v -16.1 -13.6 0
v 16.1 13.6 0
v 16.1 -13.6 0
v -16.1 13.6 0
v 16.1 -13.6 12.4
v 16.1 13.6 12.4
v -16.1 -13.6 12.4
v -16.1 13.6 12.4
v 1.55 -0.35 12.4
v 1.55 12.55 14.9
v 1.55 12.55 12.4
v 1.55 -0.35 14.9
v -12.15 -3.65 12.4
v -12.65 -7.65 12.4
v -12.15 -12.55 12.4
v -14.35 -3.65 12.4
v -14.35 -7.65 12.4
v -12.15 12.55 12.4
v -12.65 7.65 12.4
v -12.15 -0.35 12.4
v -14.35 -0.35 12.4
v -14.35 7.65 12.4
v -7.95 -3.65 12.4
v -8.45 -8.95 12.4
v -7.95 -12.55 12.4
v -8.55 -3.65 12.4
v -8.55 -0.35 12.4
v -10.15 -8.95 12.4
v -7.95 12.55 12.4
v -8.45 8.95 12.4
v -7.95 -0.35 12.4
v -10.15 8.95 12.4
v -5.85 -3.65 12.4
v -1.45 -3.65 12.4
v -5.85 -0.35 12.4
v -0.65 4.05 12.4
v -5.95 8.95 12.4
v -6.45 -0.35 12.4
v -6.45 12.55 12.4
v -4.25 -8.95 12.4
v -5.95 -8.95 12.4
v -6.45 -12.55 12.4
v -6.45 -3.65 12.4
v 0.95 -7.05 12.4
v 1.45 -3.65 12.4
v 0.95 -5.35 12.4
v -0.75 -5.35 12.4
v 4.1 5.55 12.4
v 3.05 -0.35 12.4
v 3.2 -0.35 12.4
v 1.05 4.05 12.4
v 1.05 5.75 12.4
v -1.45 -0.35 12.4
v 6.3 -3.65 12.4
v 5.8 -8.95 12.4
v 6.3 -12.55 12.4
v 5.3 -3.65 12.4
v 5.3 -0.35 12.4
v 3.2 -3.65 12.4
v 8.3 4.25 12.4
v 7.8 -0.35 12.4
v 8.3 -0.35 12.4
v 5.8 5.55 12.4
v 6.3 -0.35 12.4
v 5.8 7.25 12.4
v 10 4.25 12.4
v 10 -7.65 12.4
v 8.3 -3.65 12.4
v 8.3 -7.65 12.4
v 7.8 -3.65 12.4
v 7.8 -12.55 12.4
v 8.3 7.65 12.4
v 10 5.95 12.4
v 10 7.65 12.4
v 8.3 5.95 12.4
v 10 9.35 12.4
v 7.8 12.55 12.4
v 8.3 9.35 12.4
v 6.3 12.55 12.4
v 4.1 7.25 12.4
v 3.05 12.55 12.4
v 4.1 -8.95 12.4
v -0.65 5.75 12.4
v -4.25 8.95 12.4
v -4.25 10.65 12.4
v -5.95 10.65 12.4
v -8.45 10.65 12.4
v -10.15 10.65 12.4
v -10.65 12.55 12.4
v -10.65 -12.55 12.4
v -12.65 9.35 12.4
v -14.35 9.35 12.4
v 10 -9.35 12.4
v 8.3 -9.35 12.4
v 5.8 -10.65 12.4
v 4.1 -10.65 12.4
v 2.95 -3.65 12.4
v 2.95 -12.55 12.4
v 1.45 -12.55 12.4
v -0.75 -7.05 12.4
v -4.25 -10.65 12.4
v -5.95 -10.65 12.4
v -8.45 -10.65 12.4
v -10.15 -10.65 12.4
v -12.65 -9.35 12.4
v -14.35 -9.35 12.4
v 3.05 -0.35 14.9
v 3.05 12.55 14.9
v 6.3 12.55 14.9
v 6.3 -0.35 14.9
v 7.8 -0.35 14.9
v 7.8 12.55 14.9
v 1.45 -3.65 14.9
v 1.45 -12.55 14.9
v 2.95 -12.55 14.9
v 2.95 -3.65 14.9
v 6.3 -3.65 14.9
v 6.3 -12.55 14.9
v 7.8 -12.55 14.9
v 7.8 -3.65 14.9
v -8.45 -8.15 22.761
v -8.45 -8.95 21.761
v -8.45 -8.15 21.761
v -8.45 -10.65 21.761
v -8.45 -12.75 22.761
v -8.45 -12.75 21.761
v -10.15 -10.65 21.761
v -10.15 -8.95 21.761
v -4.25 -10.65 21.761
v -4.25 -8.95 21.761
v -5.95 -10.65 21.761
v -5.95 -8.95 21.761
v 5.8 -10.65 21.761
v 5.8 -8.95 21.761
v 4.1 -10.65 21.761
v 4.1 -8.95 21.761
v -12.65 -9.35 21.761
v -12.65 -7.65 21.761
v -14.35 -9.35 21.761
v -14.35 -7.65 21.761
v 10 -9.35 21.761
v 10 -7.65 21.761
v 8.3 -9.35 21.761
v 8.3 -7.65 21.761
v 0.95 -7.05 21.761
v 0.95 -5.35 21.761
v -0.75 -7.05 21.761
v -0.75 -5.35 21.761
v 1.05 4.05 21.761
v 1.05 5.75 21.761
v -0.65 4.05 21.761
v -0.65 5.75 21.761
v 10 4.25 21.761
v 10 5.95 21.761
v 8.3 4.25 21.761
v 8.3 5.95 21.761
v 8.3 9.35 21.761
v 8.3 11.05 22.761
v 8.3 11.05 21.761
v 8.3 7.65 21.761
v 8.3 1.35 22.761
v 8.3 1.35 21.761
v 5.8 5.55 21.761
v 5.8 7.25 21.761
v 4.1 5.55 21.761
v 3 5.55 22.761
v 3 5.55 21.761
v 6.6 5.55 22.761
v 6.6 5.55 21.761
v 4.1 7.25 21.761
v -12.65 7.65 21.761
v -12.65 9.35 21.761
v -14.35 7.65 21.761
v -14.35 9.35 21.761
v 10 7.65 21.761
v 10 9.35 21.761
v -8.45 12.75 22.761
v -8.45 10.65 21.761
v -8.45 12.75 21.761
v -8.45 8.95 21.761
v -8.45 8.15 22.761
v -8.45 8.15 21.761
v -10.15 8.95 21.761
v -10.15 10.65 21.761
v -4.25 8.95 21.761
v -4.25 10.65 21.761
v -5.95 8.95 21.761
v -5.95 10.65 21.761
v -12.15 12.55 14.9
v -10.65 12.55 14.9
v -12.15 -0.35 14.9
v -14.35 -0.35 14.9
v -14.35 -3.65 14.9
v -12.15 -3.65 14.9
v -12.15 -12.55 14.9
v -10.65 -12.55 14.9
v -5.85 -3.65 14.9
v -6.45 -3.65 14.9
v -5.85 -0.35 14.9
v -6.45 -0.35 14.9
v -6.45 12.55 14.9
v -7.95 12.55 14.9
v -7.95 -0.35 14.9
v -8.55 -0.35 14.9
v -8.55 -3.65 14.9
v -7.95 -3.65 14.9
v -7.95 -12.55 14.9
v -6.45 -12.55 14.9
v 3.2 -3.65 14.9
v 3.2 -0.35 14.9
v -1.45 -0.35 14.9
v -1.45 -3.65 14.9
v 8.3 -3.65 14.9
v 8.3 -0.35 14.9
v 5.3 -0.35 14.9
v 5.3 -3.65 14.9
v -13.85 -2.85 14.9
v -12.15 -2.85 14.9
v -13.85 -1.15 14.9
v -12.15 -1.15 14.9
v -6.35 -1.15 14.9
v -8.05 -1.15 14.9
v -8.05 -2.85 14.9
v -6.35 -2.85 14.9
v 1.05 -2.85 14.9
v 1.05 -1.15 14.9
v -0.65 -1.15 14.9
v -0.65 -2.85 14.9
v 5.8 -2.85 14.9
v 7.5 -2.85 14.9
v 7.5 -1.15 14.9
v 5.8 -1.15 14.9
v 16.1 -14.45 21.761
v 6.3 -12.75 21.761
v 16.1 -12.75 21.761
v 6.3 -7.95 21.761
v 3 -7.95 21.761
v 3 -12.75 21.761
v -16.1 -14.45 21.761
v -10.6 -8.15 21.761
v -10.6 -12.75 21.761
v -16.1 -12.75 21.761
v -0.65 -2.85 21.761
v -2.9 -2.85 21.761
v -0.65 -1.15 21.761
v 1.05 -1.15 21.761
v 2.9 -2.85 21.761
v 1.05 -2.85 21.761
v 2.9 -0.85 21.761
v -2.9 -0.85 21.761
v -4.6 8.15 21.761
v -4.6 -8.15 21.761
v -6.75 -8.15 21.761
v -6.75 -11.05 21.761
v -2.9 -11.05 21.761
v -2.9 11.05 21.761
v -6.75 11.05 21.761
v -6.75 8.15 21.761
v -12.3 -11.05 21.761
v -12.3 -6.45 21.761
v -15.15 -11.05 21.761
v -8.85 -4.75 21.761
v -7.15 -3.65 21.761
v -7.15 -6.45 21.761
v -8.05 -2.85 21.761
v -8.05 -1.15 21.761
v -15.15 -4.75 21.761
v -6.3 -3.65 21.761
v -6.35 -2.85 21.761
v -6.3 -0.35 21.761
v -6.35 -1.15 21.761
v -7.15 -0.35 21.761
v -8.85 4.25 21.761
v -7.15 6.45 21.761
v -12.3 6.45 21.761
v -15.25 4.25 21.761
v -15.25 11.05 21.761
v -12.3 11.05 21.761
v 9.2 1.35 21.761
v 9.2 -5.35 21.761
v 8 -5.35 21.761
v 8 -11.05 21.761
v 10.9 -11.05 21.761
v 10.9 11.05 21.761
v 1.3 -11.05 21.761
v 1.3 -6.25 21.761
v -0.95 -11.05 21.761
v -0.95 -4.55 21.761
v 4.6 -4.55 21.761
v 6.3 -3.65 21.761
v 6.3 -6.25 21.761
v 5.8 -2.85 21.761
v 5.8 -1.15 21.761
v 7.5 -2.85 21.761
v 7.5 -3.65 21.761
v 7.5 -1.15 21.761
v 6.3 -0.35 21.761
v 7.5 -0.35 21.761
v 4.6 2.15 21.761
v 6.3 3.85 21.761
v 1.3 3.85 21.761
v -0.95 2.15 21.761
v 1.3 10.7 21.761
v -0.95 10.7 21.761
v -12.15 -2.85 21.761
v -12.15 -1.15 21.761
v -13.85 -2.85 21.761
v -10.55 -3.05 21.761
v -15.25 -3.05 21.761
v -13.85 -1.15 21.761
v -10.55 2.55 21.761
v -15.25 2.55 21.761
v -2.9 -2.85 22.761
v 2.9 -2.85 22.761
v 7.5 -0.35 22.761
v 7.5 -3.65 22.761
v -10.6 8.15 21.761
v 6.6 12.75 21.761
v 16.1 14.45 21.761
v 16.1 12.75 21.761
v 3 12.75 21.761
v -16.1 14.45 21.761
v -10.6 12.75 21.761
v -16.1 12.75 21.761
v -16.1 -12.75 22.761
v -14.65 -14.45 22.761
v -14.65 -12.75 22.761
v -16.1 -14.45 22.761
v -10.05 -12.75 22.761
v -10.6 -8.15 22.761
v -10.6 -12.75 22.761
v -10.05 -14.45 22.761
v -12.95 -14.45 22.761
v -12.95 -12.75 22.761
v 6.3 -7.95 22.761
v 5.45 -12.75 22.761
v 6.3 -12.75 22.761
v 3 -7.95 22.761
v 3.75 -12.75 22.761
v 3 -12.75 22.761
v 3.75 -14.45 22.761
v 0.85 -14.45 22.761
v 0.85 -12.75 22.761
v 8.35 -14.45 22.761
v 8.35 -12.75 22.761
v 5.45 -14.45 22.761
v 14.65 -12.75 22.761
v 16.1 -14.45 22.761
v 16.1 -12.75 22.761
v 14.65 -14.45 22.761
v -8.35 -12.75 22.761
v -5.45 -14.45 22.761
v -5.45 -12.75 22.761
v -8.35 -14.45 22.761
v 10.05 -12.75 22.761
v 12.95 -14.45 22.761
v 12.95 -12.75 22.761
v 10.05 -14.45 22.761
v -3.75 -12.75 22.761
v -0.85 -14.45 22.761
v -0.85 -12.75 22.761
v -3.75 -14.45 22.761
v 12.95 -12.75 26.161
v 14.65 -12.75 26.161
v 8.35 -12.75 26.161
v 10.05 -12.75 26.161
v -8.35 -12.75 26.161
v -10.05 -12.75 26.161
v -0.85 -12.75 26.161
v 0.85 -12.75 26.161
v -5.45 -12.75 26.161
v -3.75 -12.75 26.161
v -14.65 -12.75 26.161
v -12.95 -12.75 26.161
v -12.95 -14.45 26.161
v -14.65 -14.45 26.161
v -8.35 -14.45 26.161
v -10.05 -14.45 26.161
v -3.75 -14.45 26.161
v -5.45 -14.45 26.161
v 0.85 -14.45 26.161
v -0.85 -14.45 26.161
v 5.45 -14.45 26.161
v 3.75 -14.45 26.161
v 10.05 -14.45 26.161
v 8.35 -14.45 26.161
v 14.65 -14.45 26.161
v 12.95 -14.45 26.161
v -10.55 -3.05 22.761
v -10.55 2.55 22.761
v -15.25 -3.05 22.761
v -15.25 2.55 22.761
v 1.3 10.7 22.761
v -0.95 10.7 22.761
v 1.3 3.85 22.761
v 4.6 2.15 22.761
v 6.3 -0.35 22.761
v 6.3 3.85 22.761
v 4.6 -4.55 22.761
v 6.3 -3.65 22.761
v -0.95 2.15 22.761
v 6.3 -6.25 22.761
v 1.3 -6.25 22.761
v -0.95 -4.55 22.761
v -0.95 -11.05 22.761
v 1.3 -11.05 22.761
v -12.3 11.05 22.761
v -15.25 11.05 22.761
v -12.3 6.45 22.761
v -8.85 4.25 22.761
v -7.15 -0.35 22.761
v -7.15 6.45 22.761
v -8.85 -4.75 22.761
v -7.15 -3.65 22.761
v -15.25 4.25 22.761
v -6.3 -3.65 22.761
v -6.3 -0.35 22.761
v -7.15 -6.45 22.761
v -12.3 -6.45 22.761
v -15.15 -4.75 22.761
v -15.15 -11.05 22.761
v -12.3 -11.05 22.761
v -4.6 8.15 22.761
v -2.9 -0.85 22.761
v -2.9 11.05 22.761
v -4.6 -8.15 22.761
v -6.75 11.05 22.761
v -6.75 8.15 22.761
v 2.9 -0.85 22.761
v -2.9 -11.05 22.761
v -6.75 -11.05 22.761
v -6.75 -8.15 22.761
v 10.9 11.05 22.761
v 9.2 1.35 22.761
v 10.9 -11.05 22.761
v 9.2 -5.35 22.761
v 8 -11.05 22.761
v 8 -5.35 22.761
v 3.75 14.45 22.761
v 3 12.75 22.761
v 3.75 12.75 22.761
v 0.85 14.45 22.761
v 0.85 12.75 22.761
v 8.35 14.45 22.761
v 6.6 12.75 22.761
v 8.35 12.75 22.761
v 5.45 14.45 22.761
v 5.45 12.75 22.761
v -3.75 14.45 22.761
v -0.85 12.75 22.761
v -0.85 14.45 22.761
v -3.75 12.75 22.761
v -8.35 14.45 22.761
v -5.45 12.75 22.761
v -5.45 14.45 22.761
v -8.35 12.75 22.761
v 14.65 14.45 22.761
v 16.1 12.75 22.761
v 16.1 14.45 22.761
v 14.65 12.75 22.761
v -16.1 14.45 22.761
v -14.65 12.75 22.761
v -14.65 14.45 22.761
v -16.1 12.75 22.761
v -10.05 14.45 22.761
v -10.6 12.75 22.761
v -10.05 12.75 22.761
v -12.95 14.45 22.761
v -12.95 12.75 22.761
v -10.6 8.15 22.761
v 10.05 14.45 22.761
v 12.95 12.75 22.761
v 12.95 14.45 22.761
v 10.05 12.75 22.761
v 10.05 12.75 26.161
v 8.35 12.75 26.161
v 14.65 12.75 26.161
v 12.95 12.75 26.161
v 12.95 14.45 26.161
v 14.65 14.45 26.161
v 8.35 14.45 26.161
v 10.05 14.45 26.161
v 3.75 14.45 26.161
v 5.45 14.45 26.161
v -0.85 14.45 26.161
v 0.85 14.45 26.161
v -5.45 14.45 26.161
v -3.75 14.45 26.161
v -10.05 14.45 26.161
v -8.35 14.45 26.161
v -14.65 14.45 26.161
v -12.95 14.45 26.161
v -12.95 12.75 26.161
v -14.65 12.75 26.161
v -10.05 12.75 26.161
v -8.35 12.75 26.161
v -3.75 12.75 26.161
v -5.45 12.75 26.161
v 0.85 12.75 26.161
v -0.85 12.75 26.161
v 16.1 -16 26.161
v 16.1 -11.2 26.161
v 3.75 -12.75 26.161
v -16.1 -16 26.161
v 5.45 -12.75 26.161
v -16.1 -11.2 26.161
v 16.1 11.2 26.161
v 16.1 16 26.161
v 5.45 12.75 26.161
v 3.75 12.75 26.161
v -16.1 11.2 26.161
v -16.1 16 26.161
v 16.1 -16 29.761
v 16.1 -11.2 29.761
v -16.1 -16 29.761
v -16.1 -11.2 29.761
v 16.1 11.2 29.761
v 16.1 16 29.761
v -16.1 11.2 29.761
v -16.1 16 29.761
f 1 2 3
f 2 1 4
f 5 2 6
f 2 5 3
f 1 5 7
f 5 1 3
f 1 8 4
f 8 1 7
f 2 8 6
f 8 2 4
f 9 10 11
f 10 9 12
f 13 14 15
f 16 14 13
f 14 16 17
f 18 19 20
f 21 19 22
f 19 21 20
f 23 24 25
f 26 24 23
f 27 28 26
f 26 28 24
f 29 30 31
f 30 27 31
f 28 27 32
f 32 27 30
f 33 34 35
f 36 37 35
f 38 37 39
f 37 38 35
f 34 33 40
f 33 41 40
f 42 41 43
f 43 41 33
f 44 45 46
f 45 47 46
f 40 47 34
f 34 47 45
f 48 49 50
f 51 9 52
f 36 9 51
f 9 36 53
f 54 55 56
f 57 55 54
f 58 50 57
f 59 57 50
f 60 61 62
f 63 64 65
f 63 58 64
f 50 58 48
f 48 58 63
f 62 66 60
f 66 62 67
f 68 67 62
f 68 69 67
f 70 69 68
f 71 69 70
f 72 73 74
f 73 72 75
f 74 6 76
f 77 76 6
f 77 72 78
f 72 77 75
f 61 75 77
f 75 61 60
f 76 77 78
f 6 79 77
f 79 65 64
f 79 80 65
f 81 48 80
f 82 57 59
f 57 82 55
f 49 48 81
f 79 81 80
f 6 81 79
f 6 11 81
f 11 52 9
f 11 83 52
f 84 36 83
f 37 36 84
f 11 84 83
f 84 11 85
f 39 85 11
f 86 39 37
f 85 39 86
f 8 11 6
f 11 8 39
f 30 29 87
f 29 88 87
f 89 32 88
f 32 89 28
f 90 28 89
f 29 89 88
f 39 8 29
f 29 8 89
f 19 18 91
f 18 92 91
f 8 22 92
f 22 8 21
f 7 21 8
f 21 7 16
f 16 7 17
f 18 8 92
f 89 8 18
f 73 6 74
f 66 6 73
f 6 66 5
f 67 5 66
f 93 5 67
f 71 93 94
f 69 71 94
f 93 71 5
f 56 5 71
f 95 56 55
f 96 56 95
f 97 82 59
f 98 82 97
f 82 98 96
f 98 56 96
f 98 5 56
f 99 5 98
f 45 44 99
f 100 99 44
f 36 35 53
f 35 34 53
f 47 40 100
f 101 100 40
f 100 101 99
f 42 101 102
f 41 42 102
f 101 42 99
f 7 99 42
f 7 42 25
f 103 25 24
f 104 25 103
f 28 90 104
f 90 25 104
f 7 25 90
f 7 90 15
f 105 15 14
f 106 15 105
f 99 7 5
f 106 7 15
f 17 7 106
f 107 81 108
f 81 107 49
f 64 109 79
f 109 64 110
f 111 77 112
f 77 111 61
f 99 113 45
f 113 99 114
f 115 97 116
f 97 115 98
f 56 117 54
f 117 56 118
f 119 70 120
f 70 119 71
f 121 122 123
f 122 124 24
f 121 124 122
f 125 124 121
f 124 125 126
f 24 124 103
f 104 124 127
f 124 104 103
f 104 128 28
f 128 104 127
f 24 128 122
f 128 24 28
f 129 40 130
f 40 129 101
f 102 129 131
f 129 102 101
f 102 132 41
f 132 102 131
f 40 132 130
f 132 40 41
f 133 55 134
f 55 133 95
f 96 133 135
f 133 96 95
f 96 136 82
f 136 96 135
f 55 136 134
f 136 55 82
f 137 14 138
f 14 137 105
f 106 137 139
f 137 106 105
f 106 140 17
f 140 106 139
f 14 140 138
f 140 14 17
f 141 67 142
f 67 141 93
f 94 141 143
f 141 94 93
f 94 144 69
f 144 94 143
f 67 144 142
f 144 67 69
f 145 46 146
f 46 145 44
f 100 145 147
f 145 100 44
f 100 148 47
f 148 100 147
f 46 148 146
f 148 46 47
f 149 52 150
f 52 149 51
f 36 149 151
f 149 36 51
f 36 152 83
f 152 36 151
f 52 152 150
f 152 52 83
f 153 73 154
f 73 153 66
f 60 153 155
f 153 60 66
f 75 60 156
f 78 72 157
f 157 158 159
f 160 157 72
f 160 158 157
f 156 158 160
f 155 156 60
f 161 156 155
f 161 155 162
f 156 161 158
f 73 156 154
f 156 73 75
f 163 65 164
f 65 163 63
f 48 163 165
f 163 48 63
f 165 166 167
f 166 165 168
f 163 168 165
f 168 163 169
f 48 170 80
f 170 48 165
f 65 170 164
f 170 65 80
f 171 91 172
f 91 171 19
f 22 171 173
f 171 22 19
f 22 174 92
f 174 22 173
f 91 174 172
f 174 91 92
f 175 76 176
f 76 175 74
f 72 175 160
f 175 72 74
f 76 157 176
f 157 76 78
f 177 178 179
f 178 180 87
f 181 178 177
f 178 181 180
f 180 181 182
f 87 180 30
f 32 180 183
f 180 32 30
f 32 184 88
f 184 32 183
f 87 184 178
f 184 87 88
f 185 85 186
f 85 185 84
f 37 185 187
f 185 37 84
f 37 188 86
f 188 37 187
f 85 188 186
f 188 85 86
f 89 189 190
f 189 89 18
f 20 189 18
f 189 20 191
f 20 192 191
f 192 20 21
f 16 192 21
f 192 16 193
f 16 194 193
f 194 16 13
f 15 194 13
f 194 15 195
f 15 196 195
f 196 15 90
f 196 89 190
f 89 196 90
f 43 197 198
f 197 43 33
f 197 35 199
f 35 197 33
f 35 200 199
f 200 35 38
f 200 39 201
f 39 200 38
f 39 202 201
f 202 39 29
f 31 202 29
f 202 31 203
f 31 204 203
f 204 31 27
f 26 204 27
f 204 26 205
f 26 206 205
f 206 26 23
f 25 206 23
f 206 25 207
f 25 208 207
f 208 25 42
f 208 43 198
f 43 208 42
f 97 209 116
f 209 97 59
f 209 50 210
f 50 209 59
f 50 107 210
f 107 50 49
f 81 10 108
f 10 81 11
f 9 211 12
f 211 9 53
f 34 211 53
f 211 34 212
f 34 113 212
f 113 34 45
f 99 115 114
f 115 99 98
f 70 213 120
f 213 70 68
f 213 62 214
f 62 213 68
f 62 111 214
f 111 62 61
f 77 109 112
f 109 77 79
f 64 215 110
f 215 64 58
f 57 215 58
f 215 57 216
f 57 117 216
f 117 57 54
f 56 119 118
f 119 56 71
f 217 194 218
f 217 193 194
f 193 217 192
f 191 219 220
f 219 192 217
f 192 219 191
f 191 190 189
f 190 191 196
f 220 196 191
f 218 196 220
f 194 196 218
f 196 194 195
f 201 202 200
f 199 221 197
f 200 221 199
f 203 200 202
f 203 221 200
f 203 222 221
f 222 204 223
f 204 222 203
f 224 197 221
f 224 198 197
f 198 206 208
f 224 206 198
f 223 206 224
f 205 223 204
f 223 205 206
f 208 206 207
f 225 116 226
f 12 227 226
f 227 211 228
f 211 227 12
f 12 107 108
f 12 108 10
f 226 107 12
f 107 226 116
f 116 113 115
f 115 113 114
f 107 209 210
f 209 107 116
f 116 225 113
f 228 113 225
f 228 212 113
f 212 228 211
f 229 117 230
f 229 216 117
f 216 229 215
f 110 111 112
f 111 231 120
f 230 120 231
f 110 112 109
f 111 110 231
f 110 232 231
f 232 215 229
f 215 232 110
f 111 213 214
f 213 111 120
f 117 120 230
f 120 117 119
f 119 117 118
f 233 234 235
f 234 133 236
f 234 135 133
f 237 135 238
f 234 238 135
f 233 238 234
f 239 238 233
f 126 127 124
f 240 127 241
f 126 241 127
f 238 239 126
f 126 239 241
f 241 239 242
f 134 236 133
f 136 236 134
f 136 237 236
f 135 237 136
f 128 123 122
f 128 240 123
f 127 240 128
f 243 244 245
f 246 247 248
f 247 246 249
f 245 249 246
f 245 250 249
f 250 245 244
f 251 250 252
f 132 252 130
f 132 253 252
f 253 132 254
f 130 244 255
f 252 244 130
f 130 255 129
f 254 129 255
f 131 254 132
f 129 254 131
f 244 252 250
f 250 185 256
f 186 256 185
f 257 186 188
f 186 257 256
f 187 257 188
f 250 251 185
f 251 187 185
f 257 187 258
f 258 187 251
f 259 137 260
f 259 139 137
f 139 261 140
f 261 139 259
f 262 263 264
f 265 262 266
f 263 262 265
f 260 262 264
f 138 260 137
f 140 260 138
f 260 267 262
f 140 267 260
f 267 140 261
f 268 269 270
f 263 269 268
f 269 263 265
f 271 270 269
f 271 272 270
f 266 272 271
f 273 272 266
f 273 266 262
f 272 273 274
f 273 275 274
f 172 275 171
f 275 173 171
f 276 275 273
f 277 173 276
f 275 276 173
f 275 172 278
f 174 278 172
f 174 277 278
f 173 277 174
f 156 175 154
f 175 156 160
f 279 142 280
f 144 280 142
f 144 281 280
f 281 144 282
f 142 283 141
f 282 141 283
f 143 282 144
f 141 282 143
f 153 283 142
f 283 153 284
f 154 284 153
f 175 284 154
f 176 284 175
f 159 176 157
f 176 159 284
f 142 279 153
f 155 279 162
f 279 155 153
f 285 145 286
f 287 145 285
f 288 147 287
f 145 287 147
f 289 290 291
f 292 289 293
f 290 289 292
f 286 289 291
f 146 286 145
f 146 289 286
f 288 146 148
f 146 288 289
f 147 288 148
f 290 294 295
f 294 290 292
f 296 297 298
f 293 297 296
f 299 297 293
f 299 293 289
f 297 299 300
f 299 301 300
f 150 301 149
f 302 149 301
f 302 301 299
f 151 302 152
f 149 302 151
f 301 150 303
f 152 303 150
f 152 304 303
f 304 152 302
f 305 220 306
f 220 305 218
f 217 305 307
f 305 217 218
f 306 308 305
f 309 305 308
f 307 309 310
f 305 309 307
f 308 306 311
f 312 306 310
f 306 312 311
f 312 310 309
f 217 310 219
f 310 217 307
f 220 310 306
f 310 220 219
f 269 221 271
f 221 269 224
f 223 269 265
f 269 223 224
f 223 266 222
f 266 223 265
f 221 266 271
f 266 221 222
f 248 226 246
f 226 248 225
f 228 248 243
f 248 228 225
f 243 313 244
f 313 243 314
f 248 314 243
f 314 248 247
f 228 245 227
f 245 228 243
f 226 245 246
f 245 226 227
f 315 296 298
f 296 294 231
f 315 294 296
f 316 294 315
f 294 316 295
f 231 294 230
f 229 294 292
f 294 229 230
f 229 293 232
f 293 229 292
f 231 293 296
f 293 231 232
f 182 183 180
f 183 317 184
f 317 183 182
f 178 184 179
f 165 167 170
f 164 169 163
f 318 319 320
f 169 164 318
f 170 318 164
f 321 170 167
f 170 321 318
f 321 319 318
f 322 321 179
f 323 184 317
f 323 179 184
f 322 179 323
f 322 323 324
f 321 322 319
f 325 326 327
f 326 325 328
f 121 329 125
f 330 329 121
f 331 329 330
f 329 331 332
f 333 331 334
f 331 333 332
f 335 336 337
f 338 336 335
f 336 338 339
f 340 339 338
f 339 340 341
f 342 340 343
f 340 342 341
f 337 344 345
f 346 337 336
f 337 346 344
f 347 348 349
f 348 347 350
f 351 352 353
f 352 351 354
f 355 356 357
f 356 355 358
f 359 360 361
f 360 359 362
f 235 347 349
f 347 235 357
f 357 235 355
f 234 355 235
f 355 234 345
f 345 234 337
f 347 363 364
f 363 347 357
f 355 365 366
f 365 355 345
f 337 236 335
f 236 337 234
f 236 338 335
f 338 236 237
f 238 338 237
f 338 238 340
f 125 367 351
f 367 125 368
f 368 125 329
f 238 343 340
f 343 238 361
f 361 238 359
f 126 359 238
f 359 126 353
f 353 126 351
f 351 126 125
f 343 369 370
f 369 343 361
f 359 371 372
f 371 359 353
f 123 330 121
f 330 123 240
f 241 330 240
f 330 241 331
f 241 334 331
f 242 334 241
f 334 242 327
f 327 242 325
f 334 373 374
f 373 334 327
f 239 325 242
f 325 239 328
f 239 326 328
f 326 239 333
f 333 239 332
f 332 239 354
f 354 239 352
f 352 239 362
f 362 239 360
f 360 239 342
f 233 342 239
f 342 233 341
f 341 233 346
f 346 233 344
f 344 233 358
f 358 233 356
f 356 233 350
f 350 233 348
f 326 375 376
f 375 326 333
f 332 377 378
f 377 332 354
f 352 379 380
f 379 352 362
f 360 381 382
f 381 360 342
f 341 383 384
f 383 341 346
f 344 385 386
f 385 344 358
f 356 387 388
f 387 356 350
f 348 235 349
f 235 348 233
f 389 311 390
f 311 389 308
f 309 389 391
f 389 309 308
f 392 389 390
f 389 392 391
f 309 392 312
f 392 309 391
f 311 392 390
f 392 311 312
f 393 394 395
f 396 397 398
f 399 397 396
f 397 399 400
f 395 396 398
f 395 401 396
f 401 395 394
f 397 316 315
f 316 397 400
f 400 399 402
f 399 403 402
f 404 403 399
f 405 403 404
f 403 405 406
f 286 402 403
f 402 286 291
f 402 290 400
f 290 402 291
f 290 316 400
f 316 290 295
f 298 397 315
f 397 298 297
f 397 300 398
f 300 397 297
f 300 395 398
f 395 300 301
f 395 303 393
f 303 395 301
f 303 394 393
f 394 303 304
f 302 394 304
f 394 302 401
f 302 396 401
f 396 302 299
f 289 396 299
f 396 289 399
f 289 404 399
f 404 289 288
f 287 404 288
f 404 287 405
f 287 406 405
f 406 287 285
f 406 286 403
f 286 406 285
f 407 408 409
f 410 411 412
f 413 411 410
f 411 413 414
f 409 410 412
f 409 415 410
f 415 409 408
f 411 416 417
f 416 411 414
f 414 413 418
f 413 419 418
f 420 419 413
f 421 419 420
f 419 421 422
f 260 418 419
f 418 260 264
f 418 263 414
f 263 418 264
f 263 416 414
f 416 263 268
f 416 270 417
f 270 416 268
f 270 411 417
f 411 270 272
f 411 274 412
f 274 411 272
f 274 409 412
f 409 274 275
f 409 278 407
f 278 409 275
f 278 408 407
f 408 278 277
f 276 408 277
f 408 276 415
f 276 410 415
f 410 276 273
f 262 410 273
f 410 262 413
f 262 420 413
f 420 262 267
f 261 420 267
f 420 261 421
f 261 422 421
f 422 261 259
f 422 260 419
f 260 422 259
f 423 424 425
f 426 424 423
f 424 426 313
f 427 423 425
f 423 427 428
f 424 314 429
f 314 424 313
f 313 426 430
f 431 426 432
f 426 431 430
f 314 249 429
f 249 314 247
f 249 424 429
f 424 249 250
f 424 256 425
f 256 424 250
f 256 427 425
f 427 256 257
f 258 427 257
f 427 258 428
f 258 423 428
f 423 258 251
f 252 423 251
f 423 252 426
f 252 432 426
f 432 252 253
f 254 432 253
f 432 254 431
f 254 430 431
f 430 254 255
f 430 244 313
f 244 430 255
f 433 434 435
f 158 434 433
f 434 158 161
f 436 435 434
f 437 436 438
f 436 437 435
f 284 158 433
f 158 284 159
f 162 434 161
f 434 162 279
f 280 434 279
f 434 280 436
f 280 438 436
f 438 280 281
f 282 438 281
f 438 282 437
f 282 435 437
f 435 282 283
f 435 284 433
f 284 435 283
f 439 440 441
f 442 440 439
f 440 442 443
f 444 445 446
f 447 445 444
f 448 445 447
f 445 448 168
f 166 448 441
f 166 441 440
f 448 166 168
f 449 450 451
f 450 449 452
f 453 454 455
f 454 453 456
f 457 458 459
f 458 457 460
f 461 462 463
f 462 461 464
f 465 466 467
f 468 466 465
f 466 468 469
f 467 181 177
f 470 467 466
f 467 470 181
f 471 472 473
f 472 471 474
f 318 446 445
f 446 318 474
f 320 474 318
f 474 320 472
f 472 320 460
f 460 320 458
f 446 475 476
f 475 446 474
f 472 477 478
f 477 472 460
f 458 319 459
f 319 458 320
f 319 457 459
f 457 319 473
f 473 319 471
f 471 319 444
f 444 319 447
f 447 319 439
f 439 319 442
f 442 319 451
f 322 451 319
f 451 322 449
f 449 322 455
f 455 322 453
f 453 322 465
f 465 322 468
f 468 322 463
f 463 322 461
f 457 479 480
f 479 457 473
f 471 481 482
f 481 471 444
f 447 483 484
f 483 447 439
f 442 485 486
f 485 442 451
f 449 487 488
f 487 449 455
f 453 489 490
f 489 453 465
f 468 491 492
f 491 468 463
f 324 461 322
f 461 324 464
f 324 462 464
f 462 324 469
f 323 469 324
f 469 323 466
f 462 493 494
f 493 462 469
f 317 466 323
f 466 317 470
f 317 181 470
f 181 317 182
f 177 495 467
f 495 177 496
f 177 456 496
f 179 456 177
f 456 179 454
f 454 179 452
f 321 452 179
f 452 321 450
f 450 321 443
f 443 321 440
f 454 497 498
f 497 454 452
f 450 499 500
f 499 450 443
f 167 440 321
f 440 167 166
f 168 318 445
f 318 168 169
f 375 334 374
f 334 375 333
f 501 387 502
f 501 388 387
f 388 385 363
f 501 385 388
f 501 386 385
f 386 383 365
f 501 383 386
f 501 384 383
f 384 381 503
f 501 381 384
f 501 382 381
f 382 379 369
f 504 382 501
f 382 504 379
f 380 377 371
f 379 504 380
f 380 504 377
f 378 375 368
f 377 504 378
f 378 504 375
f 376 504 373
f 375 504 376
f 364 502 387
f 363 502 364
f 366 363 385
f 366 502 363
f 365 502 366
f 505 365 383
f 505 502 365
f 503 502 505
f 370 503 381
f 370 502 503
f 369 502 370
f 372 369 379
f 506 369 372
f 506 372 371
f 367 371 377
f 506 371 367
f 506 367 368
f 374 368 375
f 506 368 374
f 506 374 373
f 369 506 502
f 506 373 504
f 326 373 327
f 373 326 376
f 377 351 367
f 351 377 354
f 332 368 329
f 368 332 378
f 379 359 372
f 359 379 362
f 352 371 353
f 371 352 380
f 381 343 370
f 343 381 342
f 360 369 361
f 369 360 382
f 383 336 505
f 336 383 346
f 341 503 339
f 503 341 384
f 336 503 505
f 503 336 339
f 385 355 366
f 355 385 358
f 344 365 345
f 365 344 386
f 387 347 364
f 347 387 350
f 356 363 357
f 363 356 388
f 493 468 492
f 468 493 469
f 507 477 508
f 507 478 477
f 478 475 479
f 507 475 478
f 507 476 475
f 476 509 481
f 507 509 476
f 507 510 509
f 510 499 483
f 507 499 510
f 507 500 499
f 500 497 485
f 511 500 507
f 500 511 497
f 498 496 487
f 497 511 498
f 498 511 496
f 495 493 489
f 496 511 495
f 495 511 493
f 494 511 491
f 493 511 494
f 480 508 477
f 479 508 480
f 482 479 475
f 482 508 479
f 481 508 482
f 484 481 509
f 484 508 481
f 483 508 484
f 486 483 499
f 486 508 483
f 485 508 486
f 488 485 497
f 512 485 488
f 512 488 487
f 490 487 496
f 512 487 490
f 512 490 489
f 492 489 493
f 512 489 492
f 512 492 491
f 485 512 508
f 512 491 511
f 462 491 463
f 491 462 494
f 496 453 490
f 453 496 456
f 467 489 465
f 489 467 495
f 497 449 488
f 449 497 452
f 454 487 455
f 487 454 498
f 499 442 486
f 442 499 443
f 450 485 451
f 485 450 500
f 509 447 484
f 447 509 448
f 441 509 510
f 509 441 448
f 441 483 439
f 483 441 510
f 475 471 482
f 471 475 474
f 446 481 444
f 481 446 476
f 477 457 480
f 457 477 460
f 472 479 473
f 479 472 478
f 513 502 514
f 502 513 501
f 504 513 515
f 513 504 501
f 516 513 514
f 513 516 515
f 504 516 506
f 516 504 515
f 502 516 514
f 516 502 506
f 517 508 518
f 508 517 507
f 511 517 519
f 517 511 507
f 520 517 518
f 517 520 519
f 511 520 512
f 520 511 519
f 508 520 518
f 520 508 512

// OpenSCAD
// Generated by SolidPython 0.4.2 on 2020-09-29 23:20:43
//!OpenSCAD

scale(v = 0.0100000000) {
	translate(v = [-1610, -1360, 0]) {
		union() {
			color(c = [0.4000000000, 0.4000000000, 0.4000000000]) {
				translate(v = [0, 0, 0]) {
					linear_extrude(height = 1000.0000000000) {
						polygon(paths = [[0, 1, 2, 3]], points = [[0, 0], [0, 2720], [3220, 2720], [3220, 0]]);
					}
				}
			}
			color(c = [0.2000000000, 0.6000000000, 0.2000000000]) {
				translate(v = [0, 0, 1000.0000000000]) {
					linear_extrude(height = 120.0000000000) {
						polygon(paths = [[0, 1, 2, 3]], points = [[0, 1305], [0, 2720], [3220, 2720], [3220, 1305]]);
					}
				}
			}
			color(c = [0.4000000000, 0.4000000000, 0.4000000000]) {
				translate(v = [0, 0, 1000.0000000000]) {
					linear_extrude(height = 120.0000000000) {
						polygon(paths = [[0, 1, 2, 3]], points = [[0, 0], [0, 1305], [3220, 1305], [3220, 0]]);
					}
				}
			}
			color(c = [0.9000000000, 0.6000000000, 0.6000000000]) {
				translate(v = [0, 0, 1120.0000000000]) {
					linear_extrude(height = 120.0000000000) {
						polygon(paths = [[0, 1, 2, 3]], points = [[1505, 1705], [1505, 2125], [1765, 2125], [1765, 1705]]);
					}
				}
			}
			color(c = [0.9000000000, 0.6000000000, 0.6000000000]) {
				translate(v = [0, 0, 1120.0000000000]) {
					linear_extrude(height = 120.0000000000) {
						polygon(paths = [[0, 1, 2, 3]], points = [[135, 2065], [135, 2485], [395, 2485], [395, 2065]]);
					}
				}
			}
			color(c = [0.9000000000, 0.6000000000, 0.6000000000]) {
				translate(v = [0, 0, 1120.0000000000]) {
					linear_extrude(height = 120.0000000000) {
						polygon(paths = [[0, 1, 2, 3]], points = [[545, 2065], [545, 2485], [815, 2485], [815, 2065]]);
					}
				}
			}
			color(c = [0.9000000000, 0.6000000000, 0.6000000000]) {
				translate(v = [0, 0, 1120.0000000000]) {
					linear_extrude(height = 120.0000000000) {
						polygon(paths = [[0, 1, 2, 3]], points = [[965, 2065], [965, 2485], [1225, 2485], [1225, 2065]]);
					}
				}
			}
			color(c = [0.9000000000, 0.6000000000, 0.6000000000]) {
				translate(v = [0, 0, 1120.0000000000]) {
					linear_extrude(height = 120.0000000000) {
						polygon(paths = [[0, 1, 2, 3, 4, 5, 6, 7]], points = [[1990, 1485], [1990, 1705], [1915, 1705], [1915, 2125], [1990, 2125], [1990, 2485], [2240, 2485], [2240, 1485]]);
					}
				}
			}
			color(c = [0.9000000000, 0.6000000000, 0.6000000000]) {
				translate(v = [0, 0, 1120.0000000000]) {
					linear_extrude(height = 120.0000000000) {
						polygon(paths = [[0, 1, 2, 3]], points = [[2390, 1485], [2390, 2485], [2650, 2485], [2650, 1485]]);
					}
				}
			}
			color(c = [0.9000000000, 0.6000000000, 0.9000000000]) {
				translate(v = [0, 0, 1120.0000000000]) {
					linear_extrude(height = 120.0000000000) {
						polygon(paths = [[0, 1, 2, 3]], points = [[135, 235], [135, 655], [395, 655], [395, 235]]);
					}
				}
			}
			color(c = [0.9000000000, 0.6000000000, 0.9000000000]) {
				translate(v = [0, 0, 1120.0000000000]) {
					linear_extrude(height = 120.0000000000) {
						polygon(paths = [[0, 1, 2, 3]], points = [[545, 235], [545, 655], [815, 655], [815, 235]]);
					}
				}
			}
			color(c = [0.9000000000, 0.6000000000, 0.9000000000]) {
				translate(v = [0, 0, 1120.0000000000]) {
					linear_extrude(height = 120.0000000000) {
						polygon(paths = [[0, 1, 2, 3]], points = [[965, 235], [965, 655], [1225, 655], [1225, 235]]);
					}
				}
			}
			color(c = [0.9000000000, 0.6000000000, 0.9000000000]) {
				translate(v = [0, 0, 1120.0000000000]) {
					linear_extrude(height = 120.0000000000) {
						polygon(paths = [[0, 1, 2, 3]], points = [[1495, 465], [1495, 885], [1755, 885], [1755, 465]]);
					}
				}
			}
			color(c = [0.9000000000, 0.6000000000, 0.9000000000]) {
				translate(v = [0, 0, 1120.0000000000]) {
					linear_extrude(height = 120.0000000000) {
						polygon(paths = [[0, 1, 2, 3, 4, 5]], points = [[1980, 235], [1980, 465], [1905, 465], [1905, 885], [2240, 885], [2240, 235]]);
					}
				}
			}
			color(c = [0.9000000000, 0.6000000000, 0.9000000000]) {
				translate(v = [0, 0, 1120.0000000000]) {
					linear_extrude(height = 120.0000000000) {
						polygon(paths = [[0, 1, 2, 3]], points = [[2390, 235], [2390, 885], [2650, 885], [2650, 235]]);
					}
				}
			}
			color(c = [0.2000000000, 0.6000000000, 0.2000000000]) {
				translate(v = [0, 0, 1120.0000000000]) {
					linear_extrude(height = 120.0000000000) {
						difference() {
							polygon(paths = [[0, 1, 2, 3]], points = [[0, 1305], [0, 2720], [3220, 2720], [3220, 1305]]);
							polygon(paths = [[0, 1, 2, 3]], points = [[2390, 1485], [2650, 1485], [2650, 2485], [2390, 2485]]);
							polygon(paths = [[0, 1, 2, 3]], points = [[1505, 1705], [1765, 1705], [1765, 2125], [1505, 2125]]);
							polygon(paths = [[0, 1, 2, 3]], points = [[135, 2065], [395, 2065], [395, 2485], [135, 2485]]);
							polygon(paths = [[0, 1, 2, 3]], points = [[545, 2065], [815, 2065], [815, 2485], [545, 2485]]);
							polygon(paths = [[0, 1, 2, 3]], points = [[965, 2065], [1225, 2065], [1225, 2485], [965, 2485]]);
							polygon(paths = [[0, 1, 2, 3, 4, 5, 6, 7]], points = [[1990, 1485], [2240, 1485], [2240, 2485], [1990, 2485], [1990, 2125], [1915, 2125], [1915, 1705], [1990, 1705]]);
						}
					}
				}
			}
			color(c = [0.4000000000, 0.4000000000, 0.4000000000]) {
				translate(v = [0, 0, 1120.0000000000]) {
					linear_extrude(height = 120.0000000000) {
						difference() {
							polygon(paths = [[0, 1, 2, 3]], points = [[0, 0], [0, 1305], [3220, 1305], [3220, 0]]);
							polygon(paths = [[0, 1, 2, 3]], points = [[135, 235], [395, 235], [395, 655], [135, 655]]);
							polygon(paths = [[0, 1, 2, 3]], points = [[545, 235], [815, 235], [815, 655], [545, 655]]);
							polygon(paths = [[0, 1, 2, 3]], points = [[965, 235], [1225, 235], [1225, 655], [965, 655]]);
							polygon(paths = [[0, 1, 2, 3]], points = [[2390, 235], [2650, 235], [2650, 885], [2390, 885]]);
							polygon(paths = [[0, 1, 2, 3]], points = [[1495, 465], [1755, 465], [1755, 885], [1495, 885]]);
							polygon(paths = [[0, 1, 2, 3, 4, 5]], points = [[1980, 235], [2240, 235], [2240, 885], [1905, 885], [1905, 465], [1980, 465]]);
						}
					}
				}
			}
			color(c = [0.1000000000, 0.1000000000, 0.1000000000]) {
				translate(v = [0, 0, 1240.0000000000]) {
					linear_extrude(height = 70.0000000000) {
						polygon(paths = [[0, 1, 2, 3]], points = [[595, 295], [595, 465], [765, 465], [765, 295]]);
					}
				}
			}
			color(c = [0.1000000000, 0.1000000000, 0.1000000000]) {
				translate(v = [0, 0, 1240.0000000000]) {
					linear_extrude(height = 70.0000000000) {
						polygon(paths = [[0, 1, 2, 3]], points = [[1015, 295], [1015, 465], [1185, 465], [1185, 295]]);
					}
				}
			}
			color(c = [0.1000000000, 0.1000000000, 0.1000000000]) {
				translate(v = [0, 0, 1240.0000000000]) {
					linear_extrude(height = 70.0000000000) {
						polygon(paths = [[0, 1, 2, 3]], points = [[2020, 295], [2020, 465], [2190, 465], [2190, 295]]);
					}
				}
			}
			color(c = [0.1000000000, 0.1000000000, 0.1000000000]) {
				translate(v = [0, 0, 1240.0000000000]) {
					linear_extrude(height = 70.0000000000) {
						polygon(paths = [[0, 1, 2, 3]], points = [[175, 425], [175, 595], [345, 595], [345, 425]]);
					}
				}
			}
			color(c = [0.1000000000, 0.1000000000, 0.1000000000]) {
				translate(v = [0, 0, 1240.0000000000]) {
					linear_extrude(height = 70.0000000000) {
						polygon(paths = [[0, 1, 2, 3]], points = [[2440, 425], [2440, 595], [2610, 595], [2610, 425]]);
					}
				}
			}
			color(c = [0.1000000000, 0.1000000000, 0.1000000000]) {
				translate(v = [0, 0, 1240.0000000000]) {
					linear_extrude(height = 70.0000000000) {
						polygon(paths = [[0, 1, 2, 3]], points = [[1535, 655], [1535, 825], [1705, 825], [1705, 655]]);
					}
				}
			}
			color(c = [0.1000000000, 0.1000000000, 0.1000000000]) {
				translate(v = [0, 0, 1240.0000000000]) {
					linear_extrude(height = 70.0000000000) {
						polygon(paths = [[0, 1, 2, 3]], points = [[1545, 1765], [1545, 1935], [1715, 1935], [1715, 1765]]);
					}
				}
			}
			color(c = [0.1000000000, 0.1000000000, 0.1000000000]) {
				translate(v = [0, 0, 1240.0000000000]) {
					linear_extrude(height = 70.0000000000) {
						polygon(paths = [[0, 1, 2, 3]], points = [[2440, 1785], [2440, 1955], [2610, 1955], [2610, 1785]]);
					}
				}
			}
			color(c = [0.1000000000, 0.1000000000, 0.1000000000]) {
				translate(v = [0, 0, 1240.0000000000]) {
					linear_extrude(height = 70.0000000000) {
						polygon(paths = [[0, 1, 2, 3]], points = [[2020, 1915], [2020, 2085], [2190, 2085], [2190, 1915]]);
					}
				}
			}
			color(c = [0.1000000000, 0.1000000000, 0.1000000000]) {
				translate(v = [0, 0, 1240.0000000000]) {
					linear_extrude(height = 70.0000000000) {
						polygon(paths = [[0, 1, 2, 3]], points = [[175, 2125], [175, 2295], [345, 2295], [345, 2125]]);
					}
				}
			}
			color(c = [0.1000000000, 0.1000000000, 0.1000000000]) {
				translate(v = [0, 0, 1240.0000000000]) {
					linear_extrude(height = 70.0000000000) {
						polygon(paths = [[0, 1, 2, 3]], points = [[2440, 2125], [2440, 2295], [2610, 2295], [2610, 2125]]);
					}
				}
			}
			color(c = [0.1000000000, 0.1000000000, 0.1000000000]) {
				translate(v = [0, 0, 1240.0000000000]) {
					linear_extrude(height = 70.0000000000) {
						polygon(paths = [[0, 1, 2, 3]], points = [[595, 2255], [595, 2425], [765, 2425], [765, 2255]]);
					}
				}
			}
			color(c = [0.1000000000, 0.1000000000, 0.1000000000]) {
				translate(v = [0, 0, 1240.0000000000]) {
					linear_extrude(height = 70.0000000000) {
						polygon(paths = [[0, 1, 2, 3]], points = [[1015, 2255], [1015, 2425], [1185, 2425], [1185, 2255]]);
					}
				}
			}
			color(c = [1.0000000000, 1.0000000000, 1.0000000000]) {
				translate(v = [0, 0, 1240.0000000000]) {
					linear_extrude(height = 70.0000000000) {
						polygon(paths = [[0, 1, 2, 3, 4, 5, 6, 7]], points = [[395, 105], [395, 995], [175, 995], [175, 1325], [395, 1325], [395, 2615], [545, 2615], [545, 105]]);
					}
				}
			}
			color(c = [1.0000000000, 1.0000000000, 1.0000000000]) {
				translate(v = [0, 0, 1240.0000000000]) {
					linear_extrude(height = 70.0000000000) {
						polygon(paths = [[0, 1, 2, 3, 4, 5, 6, 7, 8, 9, 10, 11]], points = [[815, 105], [815, 995], [755, 995], [755, 1325], [815, 1325], [815, 2615], [965, 2615], [965, 1325], [1025, 1325], [1025, 995], [965, 995], [965, 105]]);
					}
				}
			}
			color(c = [1.0000000000, 1.0000000000, 1.0000000000]) {
				translate(v = [0, 0, 1240.0000000000]) {
					linear_extrude(height = 70.0000000000) {
						polygon(paths = [[0, 1, 2, 3, 4, 5, 6, 7, 8, 9, 10, 11]], points = [[1755, 105], [1755, 995], [1465, 995], [1465, 1325], [1765, 1325], [1765, 2615], [1915, 2615], [1915, 1325], [1930, 1325], [1930, 995], [1905, 995], [1905, 105]]);
					}
				}
			}
			color(c = [1.0000000000, 1.0000000000, 1.0000000000]) {
				translate(v = [0, 0, 1240.0000000000]) {
					linear_extrude(height = 70.0000000000) {
						polygon(paths = [[0, 1, 2, 3, 4, 5, 6, 7, 8, 9, 10, 11]], points = [[2240, 105], [2240, 995], [2140, 995], [2140, 1325], [2240, 1325], [2240, 2615], [2390, 2615], [2390, 1325], [2440, 1325], [2440, 995], [2390, 995], [2390, 105]]);
					}
				}
			}
			color(c = [0.1000000000, 0.1000000000, 0.1000000000]) {
				translate(v = [0, 0, 1310.0000000000]) {
					linear_extrude(height = 180.0000000000) {
						polygon(paths = [[0, 1, 2, 3]], points = [[595, 295], [595, 465], [765, 465], [765, 295]]);
					}
				}
			}
			color(c = [0.1000000000, 0.1000000000, 0.1000000000]) {
				translate(v = [0, 0, 1310.0000000000]) {
					linear_extrude(height = 180.0000000000) {
						polygon(paths = [[0, 1, 2, 3]], points = [[1015, 295], [1015, 465], [1185, 465], [1185, 295]]);
					}
				}
			}
			color(c = [0.1000000000, 0.1000000000, 0.1000000000]) {
				translate(v = [0, 0, 1310.0000000000]) {
					linear_extrude(height = 180.0000000000) {
						polygon(paths = [[0, 1, 2, 3]], points = [[2020, 295], [2020, 465], [2190, 465], [2190, 295]]);
					}
				}
			}
			color(c = [0.1000000000, 0.1000000000, 0.1000000000]) {
				translate(v = [0, 0, 1310.0000000000]) {
					linear_extrude(height = 180.0000000000) {
						polygon(paths = [[0, 1, 2, 3]], points = [[175, 425], [175, 595], [345, 595], [345, 425]]);
					}
				}
			}
			color(c = [0.1000000000, 0.1000000000, 0.1000000000]) {
				translate(v = [0, 0, 1310.0000000000]) {
					linear_extrude(height = 180.0000000000) {
						polygon(paths = [[0, 1, 2, 3]], points = [[2440, 425], [2440, 595], [2610, 595], [2610, 425]]);
					}
				}
			}
			color(c = [0.1000000000, 0.1000000000, 0.1000000000]) {
				translate(v = [0, 0, 1310.0000000000]) {
					linear_extrude(height = 180.0000000000) {
						polygon(paths = [[0, 1, 2, 3]], points = [[1535, 655], [1535, 825], [1705, 825], [1705, 655]]);
					}
				}
			}
			color(c = [0.1000000000, 0.1000000000, 0.1000000000]) {
				translate(v = [0, 0, 1310.0000000000]) {
					linear_extrude(height = 180.0000000000) {
						polygon(paths = [[0, 1, 2, 3]], points = [[1545, 1765], [1545, 1935], [1715, 1935], [1715, 1765]]);
					}
				}
			}
			color(c = [0.1000000000, 0.1000000000, 0.1000000000]) {
				translate(v = [0, 0, 1310.0000000000]) {
					linear_extrude(height = 180.0000000000) {
						polygon(paths = [[0, 1, 2, 3]], points = [[2440, 1785], [2440, 1955], [2610, 1955], [2610, 1785]]);
					}
				}
			}
			color(c = [0.1000000000, 0.1000000000, 0.1000000000]) {
				translate(v = [0, 0, 1310.0000000000]) {
					linear_extrude(height = 180.0000000000) {
						polygon(paths = [[0, 1, 2, 3]], points = [[2020, 1915], [2020, 2085], [2190, 2085], [2190, 1915]]);
					}
				}
			}
			color(c = [0.1000000000, 0.1000000000, 0.1000000000]) {
				translate(v = [0, 0, 1310.0000000000]) {
					linear_extrude(height = 180.0000000000) {
						polygon(paths = [[0, 1, 2, 3]], points = [[175, 2125], [175, 2295], [345, 2295], [345, 2125]]);
					}
				}
			}
			color(c = [0.1000000000, 0.1000000000, 0.1000000000]) {
				translate(v = [0, 0, 1310.0000000000]) {
					linear_extrude(height = 180.0000000000) {
						polygon(paths = [[0, 1, 2, 3]], points = [[2440, 2125], [2440, 2295], [2610, 2295], [2610, 2125]]);
					}
				}
			}
			color(c = [0.1000000000, 0.1000000000, 0.1000000000]) {
				translate(v = [0, 0, 1310.0000000000]) {
					linear_extrude(height = 180.0000000000) {
						polygon(paths = [[0, 1, 2, 3]], points = [[595, 2255], [595, 2425], [765, 2425], [765, 2255]]);
					}
				}
			}
			color(c = [0.1000000000, 0.1000000000, 0.1000000000]) {
				translate(v = [0, 0, 1310.0000000000]) {
					linear_extrude(height = 180.0000000000) {
						polygon(paths = [[0, 1, 2, 3]], points = [[1015, 2255], [1015, 2425], [1185, 2425], [1185, 2255]]);
					}
				}
			}
			color(c = [0.7000000000, 0, 0]) {
				translate(v = [0, 0, 1310.0000000000]) {
					linear_extrude(height = 180.0000000000) {
						polygon(paths = [[0, 1, 2, 3, 4, 5, 6, 7]], points = [[395, 105], [395, 995], [175, 995], [175, 1325], [395, 1325], [395, 2615], [545, 2615], [545, 105]]);
					}
				}
			}
			color(c = [0.7000000000, 0, 0]) {
				translate(v = [0, 0, 1310.0000000000]) {
					linear_extrude(height = 180.0000000000) {
						polygon(paths = [[0, 1, 2, 3, 4, 5, 6, 7, 8, 9, 10, 11]], points = [[815, 105], [815, 995], [755, 995], [755, 1325], [815, 1325], [815, 2615], [965, 2615], [965, 1325], [1025, 1325], [1025, 995], [965, 995], [965, 105]]);
					}
				}
			}
			color(c = [0.7000000000, 0, 0]) {
				translate(v = [0, 0, 1310.0000000000]) {
					linear_extrude(height = 180.0000000000) {
						polygon(paths = [[0, 1, 2, 3, 4, 5, 6, 7, 8, 9, 10, 11]], points = [[1755, 105], [1755, 995], [1465, 995], [1465, 1325], [1765, 1325], [1765, 2615], [1915, 2615], [1915, 1325], [1930, 1325], [1930, 995], [1905, 995], [1905, 105]]);
					}
				}
			}
			color(c = [0.7000000000, 0, 0]) {
				translate(v = [0, 0, 1310.0000000000]) {
					linear_extrude(height = 180.0000000000) {
						polygon(paths = [[0, 1, 2, 3, 4, 5, 6, 7, 8, 9, 10, 11]], points = [[2240, 105], [2240, 995], [2140, 995], [2140, 1325], [2240, 1325], [2240, 2615], [2390, 2615], [2390, 1325], [2440, 1325], [2440, 995], [2390, 995], [2390, 105]]);
					}
				}
			}
			color(c = [0.1000000000, 0.1000000000, 0.1000000000]) {
				translate(v = [0, 0, 1490.0000000000]) {
					linear_extrude(height = 686.1000000000) {
						polygon(paths = [[0, 1, 2, 3]], points = [[595, 295], [595, 465], [765, 465], [765, 295]]);
					}
				}
			}
			color(c = [0.1000000000, 0.1000000000, 0.1000000000]) {
				translate(v = [0, 0, 1490.0000000000]) {
					linear_extrude(height = 686.1000000000) {
						polygon(paths = [[0, 1, 2, 3]], points = [[1015, 295], [1015, 465], [1185, 465], [1185, 295]]);
					}
				}
			}
			color(c = [0.1000000000, 0.1000000000, 0.1000000000]) {
				translate(v = [0, 0, 1490.0000000000]) {
					linear_extrude(height = 686.1000000000) {
						polygon(paths = [[0, 1, 2, 3]], points = [[2020, 295], [2020, 465], [2190, 465], [2190, 295]]);
					}
				}
			}
			color(c = [0.1000000000, 0.1000000000, 0.1000000000]) {
				translate(v = [0, 0, 1490.0000000000]) {
					linear_extrude(height = 686.1000000000) {
						polygon(paths = [[0, 1, 2, 3]], points = [[175, 425], [175, 595], [345, 595], [345, 425]]);
					}
				}
			}
			color(c = [0.1000000000, 0.1000000000, 0.1000000000]) {
				translate(v = [0, 0, 1490.0000000000]) {
					linear_extrude(height = 686.1000000000) {
						polygon(paths = [[0, 1, 2, 3]], points = [[2440, 425], [2440, 595], [2610, 595], [2610, 425]]);
					}
				}
			}
			color(c = [0.1000000000, 0.1000000000, 0.1000000000]) {
				translate(v = [0, 0, 1490.0000000000]) {
					linear_extrude(height = 686.1000000000) {
						polygon(paths = [[0, 1, 2, 3]], points = [[1535, 655], [1535, 825], [1705, 825], [1705, 655]]);
					}
				}
			}
			color(c = [0.1000000000, 0.1000000000, 0.1000000000]) {
				translate(v = [0, 0, 1490.0000000000]) {
					linear_extrude(height = 686.1000000000) {
						polygon(paths = [[0, 1, 2, 3]], points = [[225, 1075], [225, 1245], [395, 1245], [395, 1075]]);
					}
				}
			}
			color(c = [0.1000000000, 0.1000000000, 0.1000000000]) {
				translate(v = [0, 0, 1490.0000000000]) {
					linear_extrude(height = 686.1000000000) {
						polygon(paths = [[0, 1, 2, 3]], points = [[805, 1075], [805, 1245], [975, 1245], [975, 1075]]);
					}
				}
			}
			color(c = [0.1000000000, 0.1000000000, 0.1000000000]) {
				translate(v = [0, 0, 1490.0000000000]) {
					linear_extrude(height = 686.1000000000) {
						polygon(paths = [[0, 1, 2, 3]], points = [[1545, 1075], [1545, 1245], [1715, 1245], [1715, 1075]]);
					}
				}
			}
			color(c = [0.1000000000, 0.1000000000, 0.1000000000]) {
				translate(v = [0, 0, 1490.0000000000]) {
					linear_extrude(height = 686.1000000000) {
						polygon(paths = [[0, 1, 2, 3]], points = [[2190, 1075], [2190, 1245], [2360, 1245], [2360, 1075]]);
					}
				}
			}
			color(c = [0.1000000000, 0.1000000000, 0.1000000000]) {
				translate(v = [0, 0, 1490.0000000000]) {
					linear_extrude(height = 686.1000000000) {
						polygon(paths = [[0, 1, 2, 3]], points = [[1545, 1765], [1545, 1935], [1715, 1935], [1715, 1765]]);
					}
				}
			}
			color(c = [0.1000000000, 0.1000000000, 0.1000000000]) {
				translate(v = [0, 0, 1490.0000000000]) {
					linear_extrude(height = 686.1000000000) {
						polygon(paths = [[0, 1, 2, 3]], points = [[2440, 1785], [2440, 1955], [2610, 1955], [2610, 1785]]);
					}
				}
			}
			color(c = [0.1000000000, 0.1000000000, 0.1000000000]) {
				translate(v = [0, 0, 1490.0000000000]) {
					linear_extrude(height = 686.1000000000) {
						polygon(paths = [[0, 1, 2, 3]], points = [[2020, 1915], [2020, 2085], [2190, 2085], [2190, 1915]]);
					}
				}
			}
			color(c = [0.1000000000, 0.1000000000, 0.1000000000]) {
				translate(v = [0, 0, 1490.0000000000]) {
					linear_extrude(height = 686.1000000000) {
						polygon(paths = [[0, 1, 2, 3]], points = [[175, 2125], [175, 2295], [345, 2295], [345, 2125]]);
					}
				}
			}
			color(c = [0.1000000000, 0.1000000000, 0.1000000000]) {
				translate(v = [0, 0, 1490.0000000000]) {
					linear_extrude(height = 686.1000000000) {
						polygon(paths = [[0, 1, 2, 3]], points = [[2440, 2125], [2440, 2295], [2610, 2295], [2610, 2125]]);
					}
				}
			}
			color(c = [0.1000000000, 0.1000000000, 0.1000000000]) {
				translate(v = [0, 0, 1490.0000000000]) {
					linear_extrude(height = 686.1000000000) {
						polygon(paths = [[0, 1, 2, 3]], points = [[595, 2255], [595, 2425], [765, 2425], [765, 2255]]);
					}
				}
			}
			color(c = [0.1000000000, 0.1000000000, 0.1000000000]) {
				translate(v = [0, 0, 1490.0000000000]) {
					linear_extrude(height = 686.1000000000) {
						polygon(paths = [[0, 1, 2, 3]], points = [[1015, 2255], [1015, 2425], [1185, 2425], [1185, 2255]]);
					}
				}
			}
			color(c = [0.9000000000, 0.6000000000, 0.6000000000]) {
				translate(v = [0, 0, 2176.1000000000]) {
					linear_extrude(height = 100.0000000000) {
						polygon(paths = [[0, 1, 2, 3, 4, 5, 6, 7, 8, 9, 10, 11]], points = [[0, -85], [0, 85], [550, 85], [550, 545], [765, 545], [765, 85], [1910, 85], [1910, 565], [2240, 565], [2240, 85], [3220, 85], [3220, -85]]);
					}
				}
			}
			color(c = [0.9000000000, 0.6000000000, 0.6000000000]) {
				translate(v = [0, 0, 2176.1000000000]) {
					linear_extrude(height = 100.0000000000) {
						polygon(paths = [[0, 1, 2, 3]], points = [[85, 1055], [85, 1615], [555, 1615], [555, 1055]]);
					}
				}
			}
			color(c = [0.9000000000, 0.6000000000, 0.6000000000]) {
				translate(v = [0, 0, 2176.1000000000]) {
					linear_extrude(height = 100.0000000000) {
						polygon(paths = [[0, 1, 2, 3, 4, 5, 6, 7, 8, 9, 10, 11, 12, 13, 14, 15]], points = [[1515, 255], [1515, 905], [2070, 905], [2070, 1575], [1515, 1575], [1515, 2430], [1740, 2430], [1740, 1745], [2240, 1745], [2240, 1325], [2360, 1325], [2360, 995], [2240, 995], [2240, 735], [1740, 735], [1740, 255]]);
					}
				}
			}
			color(c = [0.9000000000, 0.6000000000, 0.6000000000]) {
				translate(v = [0, 0, 2176.1000000000]) {
					linear_extrude(height = 100.0000000000) {
						polygon(paths = [[0, 1, 2, 3, 4, 5, 6, 7, 8, 9, 10, 11, 12, 13, 14, 15]], points = [[95, 255], [95, 885], [725, 885], [725, 1785], [85, 1785], [85, 2465], [380, 2465], [380, 2005], [895, 2005], [895, 1325], [980, 1325], [980, 995], [895, 995], [895, 715], [380, 715], [380, 255]]);
					}
				}
			}
			color(c = [0.9000000000, 0.6000000000, 0.6000000000]) {
				translate(v = [0, 0, 2176.1000000000]) {
					linear_extrude(height = 100.0000000000) {
						polygon(paths = [[0, 1, 2, 3, 4, 5, 6, 7, 8, 9, 10, 11]], points = [[935, 255], [935, 545], [1150, 545], [1150, 2175], [935, 2175], [935, 2465], [1320, 2465], [1320, 1275], [1900, 1275], [1900, 1075], [1320, 1075], [1320, 255]]);
					}
				}
			}
			color(c = [0.9000000000, 0.6000000000, 0.6000000000]) {
				translate(v = [0, 0, 2176.1000000000]) {
					linear_extrude(height = 100.0000000000) {
						polygon(paths = [[0, 1, 2, 3, 4, 5, 6, 7]], points = [[2410, 255], [2410, 825], [2530, 825], [2530, 1495], [2440, 1495], [2440, 2465], [2700, 2465], [2700, 255]]);
					}
				}
			}
			color(c = [0.9000000000, 0.6000000000, 0.6000000000]) {
				translate(v = [0, 0, 2176.1000000000]) {
					linear_extrude(height = 100.0000000000) {
						polygon(paths = [[0, 1, 2, 3, 4, 5, 6, 7, 8, 9, 10, 11]], points = [[1910, 1915], [1910, 2635], [765, 2635], [765, 2175], [550, 2175], [550, 2635], [0, 2635], [0, 2805], [3220, 2805], [3220, 2635], [2270, 2635], [2270, 1915]]);
					}
				}
			}
			color(c = [0.5000000000, 0.5000000000, 0.5000000000]) {
				translate(v = [0, 0, 2276.1000000000]) {
					linear_extrude(height = 340.0000000000) {
						polygon(paths = [[0, 1, 2, 3]], points = [[145, -85], [145, 85], [315, 85], [315, -85]]);
					}
				}
			}
			color(c = [0.5000000000, 0.5000000000, 0.5000000000]) {
				translate(v = [0, 0, 2276.1000000000]) {
					linear_extrude(height = 340.0000000000) {
						polygon(paths = [[0, 1, 2, 3]], points = [[605, -85], [605, 85], [775, 85], [775, -85]]);
					}
				}
			}
			color(c = [0.5000000000, 0.5000000000, 0.5000000000]) {
				translate(v = [0, 0, 2276.1000000000]) {
					linear_extrude(height = 340.0000000000) {
						polygon(paths = [[0, 1, 2, 3]], points = [[1065, -85], [1065, 85], [1235, 85], [1235, -85]]);
					}
				}
			}
			color(c = [0.5000000000, 0.5000000000, 0.5000000000]) {
				translate(v = [0, 0, 2276.1000000000]) {
					linear_extrude(height = 340.0000000000) {
						polygon(paths = [[0, 1, 2, 3]], points = [[1525, -85], [1525, 85], [1695, 85], [1695, -85]]);
					}
				}
			}
			color(c = [0.5000000000, 0.5000000000, 0.5000000000]) {
				translate(v = [0, 0, 2276.1000000000]) {
					linear_extrude(height = 340.0000000000) {
						polygon(paths = [[0, 1, 2, 3]], points = [[1985, -85], [1985, 85], [2155, 85], [2155, -85]]);
					}
				}
			}
			color(c = [0.5000000000, 0.5000000000, 0.5000000000]) {
				translate(v = [0, 0, 2276.1000000000]) {
					linear_extrude(height = 340.0000000000) {
						polygon(paths = [[0, 1, 2, 3]], points = [[2445, -85], [2445, 85], [2615, 85], [2615, -85]]);
					}
				}
			}
			color(c = [0.5000000000, 0.5000000000, 0.5000000000]) {
				translate(v = [0, 0, 2276.1000000000]) {
					linear_extrude(height = 340.0000000000) {
						polygon(paths = [[0, 1, 2, 3]], points = [[2905, -85], [2905, 85], [3075, 85], [3075, -85]]);
					}
				}
			}
			color(c = [0.5000000000, 0.5000000000, 0.5000000000]) {
				translate(v = [0, 0, 2276.1000000000]) {
					linear_extrude(height = 340.0000000000) {
						polygon(paths = [[0, 1, 2, 3]], points = [[145, 2635], [145, 2805], [315, 2805], [315, 2635]]);
					}
				}
			}
			color(c = [0.5000000000, 0.5000000000, 0.5000000000]) {
				translate(v = [0, 0, 2276.1000000000]) {
					linear_extrude(height = 340.0000000000) {
						polygon(paths = [[0, 1, 2, 3]], points = [[605, 2635], [605, 2805], [775, 2805], [775, 2635]]);
					}
				}
			}
			color(c = [0.5000000000, 0.5000000000, 0.5000000000]) {
				translate(v = [0, 0, 2276.1000000000]) {
					linear_extrude(height = 340.0000000000) {
						polygon(paths = [[0, 1, 2, 3]], points = [[1065, 2635], [1065, 2805], [1235, 2805], [1235, 2635]]);
					}
				}
			}
			color(c = [0.5000000000, 0.5000000000, 0.5000000000]) {
				translate(v = [0, 0, 2276.1000000000]) {
					linear_extrude(height = 340.0000000000) {
						polygon(paths = [[0, 1, 2, 3]], points = [[1525, 2635], [1525, 2805], [1695, 2805], [1695, 2635]]);
					}
				}
			}
			color(c = [0.5000000000, 0.5000000000, 0.5000000000]) {
				translate(v = [0, 0, 2276.1000000000]) {
					linear_extrude(height = 340.0000000000) {
						polygon(paths = [[0, 1, 2, 3]], points = [[1985, 2635], [1985, 2805], [2155, 2805], [2155, 2635]]);
					}
				}
			}
			color(c = [0.5000000000, 0.5000000000, 0.5000000000]) {
				translate(v = [0, 0, 2276.1000000000]) {
					linear_extrude(height = 340.0000000000) {
						polygon(paths = [[0, 1, 2, 3]], points = [[2445, 2635], [2445, 2805], [2615, 2805], [2615, 2635]]);
					}
				}
			}
			color(c = [0.5000000000, 0.5000000000, 0.5000000000]) {
				translate(v = [0, 0, 2276.1000000000]) {
					linear_extrude(height = 340.0000000000) {
						polygon(paths = [[0, 1, 2, 3]], points = [[2905, 2635], [2905, 2805], [3075, 2805], [3075, 2635]]);
					}
				}
			}
			color(c = [0.3000000000, 0.3000000000, 1]) {
				translate(v = [0, 0, 2616.1000000000]) {
					linear_extrude(height = 360.0000000000) {
						polygon(paths = [[0, 1, 2, 3]], points = [[0, -240], [0, 240], [3220, 240], [3220, -240]]);
					}
				}
			}
			color(c = [0.3000000000, 0.3000000000, 1]) {
				translate(v = [0, 0, 2616.1000000000]) {
					linear_extrude(height = 360.0000000000) {
						polygon(paths = [[0, 1, 2, 3]], points = [[0, 2480], [0, 2960], [3220, 2960], [3220, 2480]]);
					}
				}
			}
		}
	}
}
